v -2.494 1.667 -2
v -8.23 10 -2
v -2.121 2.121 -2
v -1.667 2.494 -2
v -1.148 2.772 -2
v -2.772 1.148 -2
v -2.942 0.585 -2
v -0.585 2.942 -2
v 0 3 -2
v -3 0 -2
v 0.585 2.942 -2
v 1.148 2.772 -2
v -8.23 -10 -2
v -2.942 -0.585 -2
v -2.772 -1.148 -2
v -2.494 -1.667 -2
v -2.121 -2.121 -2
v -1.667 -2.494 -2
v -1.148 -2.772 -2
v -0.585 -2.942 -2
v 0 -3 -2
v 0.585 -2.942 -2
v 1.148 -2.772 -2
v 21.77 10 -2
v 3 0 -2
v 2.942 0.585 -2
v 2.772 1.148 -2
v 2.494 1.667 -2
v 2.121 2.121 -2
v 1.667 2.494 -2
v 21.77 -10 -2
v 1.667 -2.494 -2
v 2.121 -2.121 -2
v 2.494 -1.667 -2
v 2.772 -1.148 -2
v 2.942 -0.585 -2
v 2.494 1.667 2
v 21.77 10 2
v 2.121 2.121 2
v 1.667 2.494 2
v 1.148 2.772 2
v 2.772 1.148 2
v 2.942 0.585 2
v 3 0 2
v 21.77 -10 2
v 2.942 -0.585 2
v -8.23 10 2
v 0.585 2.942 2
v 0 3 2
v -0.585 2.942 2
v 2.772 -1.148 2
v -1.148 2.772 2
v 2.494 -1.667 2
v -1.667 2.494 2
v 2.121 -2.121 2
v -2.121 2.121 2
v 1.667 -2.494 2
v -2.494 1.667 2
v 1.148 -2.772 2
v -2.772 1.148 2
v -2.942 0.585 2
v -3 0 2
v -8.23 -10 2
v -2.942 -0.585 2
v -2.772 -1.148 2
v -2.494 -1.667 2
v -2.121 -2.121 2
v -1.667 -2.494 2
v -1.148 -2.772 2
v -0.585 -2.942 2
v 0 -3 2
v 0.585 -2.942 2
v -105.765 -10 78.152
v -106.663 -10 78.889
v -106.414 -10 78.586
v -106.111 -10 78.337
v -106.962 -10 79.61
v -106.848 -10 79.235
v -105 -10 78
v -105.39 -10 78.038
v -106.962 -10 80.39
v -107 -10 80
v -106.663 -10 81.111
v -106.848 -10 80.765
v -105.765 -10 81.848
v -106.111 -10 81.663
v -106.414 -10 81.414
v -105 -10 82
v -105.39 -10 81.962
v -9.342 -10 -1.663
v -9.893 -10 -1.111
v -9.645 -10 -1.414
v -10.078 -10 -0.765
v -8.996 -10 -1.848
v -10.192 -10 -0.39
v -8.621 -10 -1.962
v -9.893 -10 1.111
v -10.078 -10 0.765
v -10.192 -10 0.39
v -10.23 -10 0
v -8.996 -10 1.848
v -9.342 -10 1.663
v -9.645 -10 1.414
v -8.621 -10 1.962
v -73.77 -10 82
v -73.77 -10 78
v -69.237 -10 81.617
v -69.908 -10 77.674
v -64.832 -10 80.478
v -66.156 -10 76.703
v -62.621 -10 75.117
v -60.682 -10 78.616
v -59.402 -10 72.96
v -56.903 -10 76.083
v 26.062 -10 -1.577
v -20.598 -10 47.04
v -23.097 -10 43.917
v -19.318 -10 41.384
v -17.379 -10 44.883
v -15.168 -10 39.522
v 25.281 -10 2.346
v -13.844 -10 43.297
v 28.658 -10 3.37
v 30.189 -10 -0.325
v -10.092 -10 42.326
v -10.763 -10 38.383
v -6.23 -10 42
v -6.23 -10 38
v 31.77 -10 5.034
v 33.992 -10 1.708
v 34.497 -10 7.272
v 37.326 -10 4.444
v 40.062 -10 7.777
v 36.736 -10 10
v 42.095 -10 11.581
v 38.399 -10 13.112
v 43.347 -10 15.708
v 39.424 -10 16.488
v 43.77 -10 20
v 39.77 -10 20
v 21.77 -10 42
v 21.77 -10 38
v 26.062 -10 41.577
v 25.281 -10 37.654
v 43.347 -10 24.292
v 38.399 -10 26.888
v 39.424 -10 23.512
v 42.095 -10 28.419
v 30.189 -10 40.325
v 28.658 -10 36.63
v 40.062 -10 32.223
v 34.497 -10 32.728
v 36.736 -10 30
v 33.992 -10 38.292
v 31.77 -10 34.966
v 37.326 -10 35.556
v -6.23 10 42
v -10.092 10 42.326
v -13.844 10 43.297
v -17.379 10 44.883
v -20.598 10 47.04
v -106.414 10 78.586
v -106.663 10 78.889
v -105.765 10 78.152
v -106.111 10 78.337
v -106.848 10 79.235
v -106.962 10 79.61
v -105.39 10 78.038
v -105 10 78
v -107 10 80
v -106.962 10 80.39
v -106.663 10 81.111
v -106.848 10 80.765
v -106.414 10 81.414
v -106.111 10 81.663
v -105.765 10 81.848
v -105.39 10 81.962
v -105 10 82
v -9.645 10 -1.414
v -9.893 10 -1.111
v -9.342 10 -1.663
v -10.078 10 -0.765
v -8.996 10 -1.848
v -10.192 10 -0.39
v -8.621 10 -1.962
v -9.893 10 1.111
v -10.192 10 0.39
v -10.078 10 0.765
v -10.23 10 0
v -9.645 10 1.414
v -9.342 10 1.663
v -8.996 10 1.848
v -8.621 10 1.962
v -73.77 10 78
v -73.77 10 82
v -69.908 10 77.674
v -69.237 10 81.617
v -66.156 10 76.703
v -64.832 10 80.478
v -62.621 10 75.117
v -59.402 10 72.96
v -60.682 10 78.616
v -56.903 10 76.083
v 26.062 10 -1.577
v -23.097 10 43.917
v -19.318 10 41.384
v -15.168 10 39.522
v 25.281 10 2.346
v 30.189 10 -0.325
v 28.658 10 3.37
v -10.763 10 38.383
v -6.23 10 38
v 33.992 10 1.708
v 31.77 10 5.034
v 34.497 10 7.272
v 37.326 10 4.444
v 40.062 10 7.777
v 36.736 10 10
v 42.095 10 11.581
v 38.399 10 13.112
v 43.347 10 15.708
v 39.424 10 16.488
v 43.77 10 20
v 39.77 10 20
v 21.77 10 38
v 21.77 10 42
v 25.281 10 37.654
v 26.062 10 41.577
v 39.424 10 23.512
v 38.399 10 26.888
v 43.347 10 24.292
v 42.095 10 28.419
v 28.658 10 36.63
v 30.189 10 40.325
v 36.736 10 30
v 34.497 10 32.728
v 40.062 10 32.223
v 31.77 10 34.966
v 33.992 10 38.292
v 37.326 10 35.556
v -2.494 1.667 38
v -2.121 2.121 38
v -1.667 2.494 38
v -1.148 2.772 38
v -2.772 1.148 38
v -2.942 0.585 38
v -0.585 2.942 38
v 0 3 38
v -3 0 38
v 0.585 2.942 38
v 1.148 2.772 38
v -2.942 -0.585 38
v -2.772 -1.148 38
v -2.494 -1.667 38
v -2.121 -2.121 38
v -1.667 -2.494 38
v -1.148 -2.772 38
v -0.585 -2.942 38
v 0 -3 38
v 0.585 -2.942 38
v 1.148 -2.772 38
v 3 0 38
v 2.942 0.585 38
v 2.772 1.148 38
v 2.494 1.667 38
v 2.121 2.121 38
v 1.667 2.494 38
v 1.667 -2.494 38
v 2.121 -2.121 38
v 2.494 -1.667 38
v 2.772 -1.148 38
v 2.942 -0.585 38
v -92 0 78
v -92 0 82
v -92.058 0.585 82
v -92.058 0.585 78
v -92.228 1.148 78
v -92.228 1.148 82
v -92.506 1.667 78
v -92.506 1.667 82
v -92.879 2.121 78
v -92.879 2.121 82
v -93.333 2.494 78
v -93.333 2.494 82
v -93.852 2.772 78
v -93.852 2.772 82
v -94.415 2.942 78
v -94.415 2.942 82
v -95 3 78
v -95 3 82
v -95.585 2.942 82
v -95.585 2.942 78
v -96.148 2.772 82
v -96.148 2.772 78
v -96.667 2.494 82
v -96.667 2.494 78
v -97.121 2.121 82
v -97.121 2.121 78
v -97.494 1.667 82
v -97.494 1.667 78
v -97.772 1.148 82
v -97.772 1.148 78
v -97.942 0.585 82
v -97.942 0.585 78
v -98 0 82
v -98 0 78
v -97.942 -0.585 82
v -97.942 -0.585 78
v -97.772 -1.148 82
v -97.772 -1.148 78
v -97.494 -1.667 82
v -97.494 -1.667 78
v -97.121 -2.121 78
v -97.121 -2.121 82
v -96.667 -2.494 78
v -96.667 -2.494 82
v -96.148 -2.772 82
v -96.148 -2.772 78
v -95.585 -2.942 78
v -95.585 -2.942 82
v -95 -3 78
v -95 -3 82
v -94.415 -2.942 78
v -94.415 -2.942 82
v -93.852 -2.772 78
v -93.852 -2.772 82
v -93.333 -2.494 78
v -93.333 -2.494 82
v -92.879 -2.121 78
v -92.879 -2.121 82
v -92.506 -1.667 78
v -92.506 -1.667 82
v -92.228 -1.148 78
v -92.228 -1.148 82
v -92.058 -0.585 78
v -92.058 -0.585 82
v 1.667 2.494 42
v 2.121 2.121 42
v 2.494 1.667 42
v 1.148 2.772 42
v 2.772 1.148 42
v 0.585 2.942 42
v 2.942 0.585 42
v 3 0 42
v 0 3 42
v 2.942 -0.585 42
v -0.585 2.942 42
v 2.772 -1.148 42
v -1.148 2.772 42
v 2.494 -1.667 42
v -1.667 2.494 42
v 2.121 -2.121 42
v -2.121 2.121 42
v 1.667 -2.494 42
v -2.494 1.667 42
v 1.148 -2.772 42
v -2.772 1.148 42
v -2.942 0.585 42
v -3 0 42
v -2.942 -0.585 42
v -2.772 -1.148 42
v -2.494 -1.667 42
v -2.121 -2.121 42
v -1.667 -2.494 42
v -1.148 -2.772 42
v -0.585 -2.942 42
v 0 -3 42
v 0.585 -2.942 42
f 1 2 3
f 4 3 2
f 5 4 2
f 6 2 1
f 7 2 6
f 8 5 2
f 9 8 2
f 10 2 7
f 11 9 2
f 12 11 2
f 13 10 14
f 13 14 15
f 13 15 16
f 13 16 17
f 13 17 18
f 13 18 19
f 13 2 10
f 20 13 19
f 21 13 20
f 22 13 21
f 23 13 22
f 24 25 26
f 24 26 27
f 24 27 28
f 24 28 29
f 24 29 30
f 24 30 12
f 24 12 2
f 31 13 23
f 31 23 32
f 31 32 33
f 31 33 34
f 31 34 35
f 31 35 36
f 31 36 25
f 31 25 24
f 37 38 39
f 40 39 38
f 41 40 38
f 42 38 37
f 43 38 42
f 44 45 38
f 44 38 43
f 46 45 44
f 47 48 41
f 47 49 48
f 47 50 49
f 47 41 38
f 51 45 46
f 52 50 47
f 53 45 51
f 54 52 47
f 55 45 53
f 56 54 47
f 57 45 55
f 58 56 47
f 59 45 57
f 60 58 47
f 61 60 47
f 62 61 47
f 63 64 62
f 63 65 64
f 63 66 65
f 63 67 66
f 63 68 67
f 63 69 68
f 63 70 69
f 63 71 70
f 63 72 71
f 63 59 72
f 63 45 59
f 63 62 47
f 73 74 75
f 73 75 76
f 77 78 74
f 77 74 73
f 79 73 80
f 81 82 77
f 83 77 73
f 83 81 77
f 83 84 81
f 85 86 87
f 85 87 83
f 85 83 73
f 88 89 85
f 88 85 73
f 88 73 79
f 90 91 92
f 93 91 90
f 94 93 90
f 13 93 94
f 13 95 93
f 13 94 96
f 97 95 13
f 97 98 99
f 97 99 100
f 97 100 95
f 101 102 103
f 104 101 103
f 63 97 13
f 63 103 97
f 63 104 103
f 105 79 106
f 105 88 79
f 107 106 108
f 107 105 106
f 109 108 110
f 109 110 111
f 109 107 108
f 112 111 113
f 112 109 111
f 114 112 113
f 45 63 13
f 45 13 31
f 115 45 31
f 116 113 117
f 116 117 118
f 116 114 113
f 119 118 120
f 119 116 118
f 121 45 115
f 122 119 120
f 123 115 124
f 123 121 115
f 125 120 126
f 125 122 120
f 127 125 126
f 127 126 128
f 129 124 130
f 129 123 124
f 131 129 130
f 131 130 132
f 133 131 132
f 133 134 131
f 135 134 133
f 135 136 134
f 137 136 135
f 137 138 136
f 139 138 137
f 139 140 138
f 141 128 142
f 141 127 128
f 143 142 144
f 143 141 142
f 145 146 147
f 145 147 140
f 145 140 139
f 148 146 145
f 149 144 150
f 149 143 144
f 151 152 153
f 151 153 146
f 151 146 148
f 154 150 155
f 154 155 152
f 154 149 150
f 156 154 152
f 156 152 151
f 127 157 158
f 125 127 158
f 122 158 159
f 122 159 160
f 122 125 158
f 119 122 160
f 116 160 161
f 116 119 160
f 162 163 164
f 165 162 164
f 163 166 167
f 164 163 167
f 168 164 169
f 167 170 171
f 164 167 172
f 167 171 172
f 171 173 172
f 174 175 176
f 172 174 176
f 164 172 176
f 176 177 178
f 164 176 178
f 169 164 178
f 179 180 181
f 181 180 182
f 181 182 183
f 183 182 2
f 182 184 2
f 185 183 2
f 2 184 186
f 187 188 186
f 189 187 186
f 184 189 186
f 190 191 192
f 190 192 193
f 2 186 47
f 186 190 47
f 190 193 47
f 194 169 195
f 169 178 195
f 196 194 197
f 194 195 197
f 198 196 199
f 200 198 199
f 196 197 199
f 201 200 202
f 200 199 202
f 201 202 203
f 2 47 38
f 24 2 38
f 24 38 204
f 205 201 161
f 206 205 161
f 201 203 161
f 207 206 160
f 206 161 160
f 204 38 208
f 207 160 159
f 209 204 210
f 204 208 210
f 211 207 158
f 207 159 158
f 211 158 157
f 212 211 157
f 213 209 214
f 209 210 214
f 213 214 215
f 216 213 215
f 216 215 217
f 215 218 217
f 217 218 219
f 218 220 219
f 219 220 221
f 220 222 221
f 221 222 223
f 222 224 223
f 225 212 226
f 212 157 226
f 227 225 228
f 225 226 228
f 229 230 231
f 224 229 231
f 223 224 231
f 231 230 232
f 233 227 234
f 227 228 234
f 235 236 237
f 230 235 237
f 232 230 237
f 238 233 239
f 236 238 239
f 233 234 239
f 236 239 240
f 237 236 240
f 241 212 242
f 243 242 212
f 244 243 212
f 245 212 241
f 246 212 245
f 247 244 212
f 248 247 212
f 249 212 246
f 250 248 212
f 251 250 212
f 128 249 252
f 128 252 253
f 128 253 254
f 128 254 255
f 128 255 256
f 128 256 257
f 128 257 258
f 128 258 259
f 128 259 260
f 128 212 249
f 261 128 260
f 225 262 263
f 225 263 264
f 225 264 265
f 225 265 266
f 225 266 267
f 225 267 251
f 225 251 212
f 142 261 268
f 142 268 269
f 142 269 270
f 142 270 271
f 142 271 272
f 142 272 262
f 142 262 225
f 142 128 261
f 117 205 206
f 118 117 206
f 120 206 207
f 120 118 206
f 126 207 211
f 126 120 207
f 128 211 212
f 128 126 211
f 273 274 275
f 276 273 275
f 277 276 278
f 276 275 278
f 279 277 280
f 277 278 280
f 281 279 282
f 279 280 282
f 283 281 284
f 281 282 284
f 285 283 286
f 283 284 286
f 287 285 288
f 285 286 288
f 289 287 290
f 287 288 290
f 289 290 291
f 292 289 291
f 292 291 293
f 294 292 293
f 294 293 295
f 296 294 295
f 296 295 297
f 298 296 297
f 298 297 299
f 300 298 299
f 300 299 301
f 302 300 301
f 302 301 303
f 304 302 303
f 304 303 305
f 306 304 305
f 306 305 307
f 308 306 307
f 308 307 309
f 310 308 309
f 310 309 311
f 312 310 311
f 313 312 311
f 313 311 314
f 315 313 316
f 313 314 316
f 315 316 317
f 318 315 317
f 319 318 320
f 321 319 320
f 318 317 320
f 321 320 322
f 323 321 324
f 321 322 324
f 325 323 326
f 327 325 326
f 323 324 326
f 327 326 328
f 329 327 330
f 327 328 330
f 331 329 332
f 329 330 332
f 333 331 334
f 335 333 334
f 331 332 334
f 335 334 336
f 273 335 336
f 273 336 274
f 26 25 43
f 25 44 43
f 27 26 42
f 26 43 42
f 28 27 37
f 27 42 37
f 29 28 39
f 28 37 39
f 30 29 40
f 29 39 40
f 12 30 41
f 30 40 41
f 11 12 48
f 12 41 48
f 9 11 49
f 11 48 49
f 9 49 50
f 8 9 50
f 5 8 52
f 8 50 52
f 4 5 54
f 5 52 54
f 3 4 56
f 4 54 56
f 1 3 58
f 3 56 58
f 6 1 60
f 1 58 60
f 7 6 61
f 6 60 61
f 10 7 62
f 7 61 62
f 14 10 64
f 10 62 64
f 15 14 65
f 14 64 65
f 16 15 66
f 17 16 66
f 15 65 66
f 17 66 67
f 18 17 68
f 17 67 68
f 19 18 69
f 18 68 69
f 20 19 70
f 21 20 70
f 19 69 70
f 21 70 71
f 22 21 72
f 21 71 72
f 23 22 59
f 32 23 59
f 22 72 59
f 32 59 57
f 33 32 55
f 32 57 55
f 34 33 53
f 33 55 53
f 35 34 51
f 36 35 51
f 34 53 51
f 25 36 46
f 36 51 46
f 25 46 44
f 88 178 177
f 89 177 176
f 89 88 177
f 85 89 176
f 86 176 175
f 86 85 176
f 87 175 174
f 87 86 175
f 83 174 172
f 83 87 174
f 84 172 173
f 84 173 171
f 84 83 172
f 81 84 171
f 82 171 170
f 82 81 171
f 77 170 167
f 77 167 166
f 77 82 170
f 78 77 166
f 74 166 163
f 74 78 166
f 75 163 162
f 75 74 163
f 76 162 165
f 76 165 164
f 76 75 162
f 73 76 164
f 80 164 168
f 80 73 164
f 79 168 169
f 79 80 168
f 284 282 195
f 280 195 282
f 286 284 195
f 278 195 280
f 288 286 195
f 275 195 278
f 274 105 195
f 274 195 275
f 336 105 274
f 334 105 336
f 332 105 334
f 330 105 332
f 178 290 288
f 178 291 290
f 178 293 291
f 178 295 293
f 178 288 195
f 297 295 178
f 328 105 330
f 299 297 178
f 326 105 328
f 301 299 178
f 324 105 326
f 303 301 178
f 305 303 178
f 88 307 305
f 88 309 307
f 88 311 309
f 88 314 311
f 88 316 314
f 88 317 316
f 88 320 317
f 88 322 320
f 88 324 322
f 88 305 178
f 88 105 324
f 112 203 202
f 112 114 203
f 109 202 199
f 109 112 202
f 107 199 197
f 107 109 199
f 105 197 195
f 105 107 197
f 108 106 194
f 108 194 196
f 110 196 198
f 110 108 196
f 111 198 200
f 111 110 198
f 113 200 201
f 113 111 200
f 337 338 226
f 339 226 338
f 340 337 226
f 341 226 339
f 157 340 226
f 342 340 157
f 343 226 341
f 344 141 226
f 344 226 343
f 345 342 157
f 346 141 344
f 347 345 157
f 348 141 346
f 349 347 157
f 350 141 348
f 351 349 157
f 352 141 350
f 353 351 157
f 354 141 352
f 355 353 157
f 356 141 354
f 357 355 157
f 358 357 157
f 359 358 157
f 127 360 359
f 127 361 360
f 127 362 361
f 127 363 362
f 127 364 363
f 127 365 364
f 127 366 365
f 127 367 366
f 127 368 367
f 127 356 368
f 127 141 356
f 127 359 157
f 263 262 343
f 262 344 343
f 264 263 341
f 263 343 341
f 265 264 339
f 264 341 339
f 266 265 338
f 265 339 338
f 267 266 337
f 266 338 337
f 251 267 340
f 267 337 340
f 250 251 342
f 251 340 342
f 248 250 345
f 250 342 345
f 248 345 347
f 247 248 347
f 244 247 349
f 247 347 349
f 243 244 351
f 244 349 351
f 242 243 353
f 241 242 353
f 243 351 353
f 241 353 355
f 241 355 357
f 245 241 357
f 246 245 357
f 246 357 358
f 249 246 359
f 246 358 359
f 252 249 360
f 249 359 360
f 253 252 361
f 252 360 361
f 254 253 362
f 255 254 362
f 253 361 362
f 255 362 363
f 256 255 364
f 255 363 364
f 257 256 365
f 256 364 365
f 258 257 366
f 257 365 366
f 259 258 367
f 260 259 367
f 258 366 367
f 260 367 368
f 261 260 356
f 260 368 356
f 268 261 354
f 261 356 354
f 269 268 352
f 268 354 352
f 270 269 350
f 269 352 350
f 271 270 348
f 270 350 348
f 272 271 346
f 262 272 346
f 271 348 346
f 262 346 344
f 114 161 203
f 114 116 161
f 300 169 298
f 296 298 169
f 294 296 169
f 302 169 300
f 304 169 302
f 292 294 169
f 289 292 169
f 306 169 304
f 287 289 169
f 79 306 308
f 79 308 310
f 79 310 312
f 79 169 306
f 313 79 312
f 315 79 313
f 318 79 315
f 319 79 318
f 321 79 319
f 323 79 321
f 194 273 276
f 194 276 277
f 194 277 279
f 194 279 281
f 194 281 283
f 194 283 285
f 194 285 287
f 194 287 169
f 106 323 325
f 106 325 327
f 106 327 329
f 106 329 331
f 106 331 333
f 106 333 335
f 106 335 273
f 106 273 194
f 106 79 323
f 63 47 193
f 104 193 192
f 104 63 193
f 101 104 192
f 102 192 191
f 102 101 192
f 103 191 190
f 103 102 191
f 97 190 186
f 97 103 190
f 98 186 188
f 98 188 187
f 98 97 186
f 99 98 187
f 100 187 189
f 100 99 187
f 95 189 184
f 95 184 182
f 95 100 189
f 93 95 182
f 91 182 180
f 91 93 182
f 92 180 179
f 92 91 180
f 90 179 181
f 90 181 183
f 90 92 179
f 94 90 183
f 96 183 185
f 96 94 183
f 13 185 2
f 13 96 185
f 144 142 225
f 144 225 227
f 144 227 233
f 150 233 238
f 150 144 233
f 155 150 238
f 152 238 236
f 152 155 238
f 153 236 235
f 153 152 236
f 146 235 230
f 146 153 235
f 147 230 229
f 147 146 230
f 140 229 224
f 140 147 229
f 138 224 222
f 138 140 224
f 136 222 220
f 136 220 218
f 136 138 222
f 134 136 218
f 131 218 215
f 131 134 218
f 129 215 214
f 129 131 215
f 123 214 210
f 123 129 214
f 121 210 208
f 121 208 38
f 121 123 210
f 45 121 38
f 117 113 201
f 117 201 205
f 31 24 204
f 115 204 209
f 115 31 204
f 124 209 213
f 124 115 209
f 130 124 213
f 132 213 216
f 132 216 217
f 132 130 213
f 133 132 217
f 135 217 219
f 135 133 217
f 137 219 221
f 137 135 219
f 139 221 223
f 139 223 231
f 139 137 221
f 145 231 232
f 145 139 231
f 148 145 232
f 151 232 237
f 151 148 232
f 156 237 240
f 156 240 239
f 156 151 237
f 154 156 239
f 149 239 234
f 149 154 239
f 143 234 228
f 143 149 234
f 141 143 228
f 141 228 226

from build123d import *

# Parameters (mm, degrees)
F1_DEPTH = 10
F2_R     = 3
F3_DEPTH = 50
F4_R     = 3
F5_DEPTH = 25


with BuildPart() as f1:
    # F0 (on Front) → F1 (new body, symmetric)
    with BuildSketch(Plane.XZ):
        with BuildLine():
            ThreePointArc((-56.90276, 76.083458), (-64.832339, 80.477965), (-73.769526, 82))
            Line((-73.769526, 82), (-105, 82))
            ThreePointArc((-105, 82), (-107, 80), (-105, 78))
            Line((-105, 78), (-73.769526, 78))
            ThreePointArc((-73.769526, 78), (-66.156367, 76.703451), (-59.40154, 72.959983))
            Line((-59.40154, 72.959983), (-23.09724, 43.916542))
            ThreePointArc((-23.09724, 43.916542), (-15.167661, 39.522035), (-6.230474, 38))
            Line((-6.230474, 38), (1.769526, 38))
            Line((1.769526, 38), (21.769526, 38))
            ThreePointArc((21.769526, 38), (39.769526, 20), (21.769526, 2))
            Line((21.769526, 2), (1.769526, 2))
            Line((1.769526, 2), (-8.230474, 2))
            ThreePointArc((-8.230474, 2), (-10.230474, 0), (-8.230474, -2))
            Line((-8.230474, -2), (1.769526, -2))
            Line((1.769526, -2), (21.769526, -2))
            ThreePointArc((21.769526, -2), (43.769526, 20), (21.769526, 42))
            Line((21.769526, 42), (1.769526, 42))
            Line((1.769526, 42), (-6.230474, 42))
            ThreePointArc((-6.230474, 42), (-13.843633, 43.296549), (-20.59846, 47.040017))
            Line((-20.59846, 47.040017), (-56.90276, 76.083458))
        make_face()
    extrude(amount=F1_DEPTH, both=True)

    # F2 (on Top) → F3 (cut, symmetric)
    with BuildSketch(Plane.XY):
        Circle(F2_R)
    extrude(amount=F3_DEPTH, both=True, mode=Mode.SUBTRACT)

    # F4 (on face) → F5 (cut)
    with BuildSketch(Plane.XY.offset(82)):
        with Locations((-95, 0)):
            Circle(F4_R)
    extrude(amount=-F5_DEPTH, mode=Mode.SUBTRACT)


solid = f1.part
